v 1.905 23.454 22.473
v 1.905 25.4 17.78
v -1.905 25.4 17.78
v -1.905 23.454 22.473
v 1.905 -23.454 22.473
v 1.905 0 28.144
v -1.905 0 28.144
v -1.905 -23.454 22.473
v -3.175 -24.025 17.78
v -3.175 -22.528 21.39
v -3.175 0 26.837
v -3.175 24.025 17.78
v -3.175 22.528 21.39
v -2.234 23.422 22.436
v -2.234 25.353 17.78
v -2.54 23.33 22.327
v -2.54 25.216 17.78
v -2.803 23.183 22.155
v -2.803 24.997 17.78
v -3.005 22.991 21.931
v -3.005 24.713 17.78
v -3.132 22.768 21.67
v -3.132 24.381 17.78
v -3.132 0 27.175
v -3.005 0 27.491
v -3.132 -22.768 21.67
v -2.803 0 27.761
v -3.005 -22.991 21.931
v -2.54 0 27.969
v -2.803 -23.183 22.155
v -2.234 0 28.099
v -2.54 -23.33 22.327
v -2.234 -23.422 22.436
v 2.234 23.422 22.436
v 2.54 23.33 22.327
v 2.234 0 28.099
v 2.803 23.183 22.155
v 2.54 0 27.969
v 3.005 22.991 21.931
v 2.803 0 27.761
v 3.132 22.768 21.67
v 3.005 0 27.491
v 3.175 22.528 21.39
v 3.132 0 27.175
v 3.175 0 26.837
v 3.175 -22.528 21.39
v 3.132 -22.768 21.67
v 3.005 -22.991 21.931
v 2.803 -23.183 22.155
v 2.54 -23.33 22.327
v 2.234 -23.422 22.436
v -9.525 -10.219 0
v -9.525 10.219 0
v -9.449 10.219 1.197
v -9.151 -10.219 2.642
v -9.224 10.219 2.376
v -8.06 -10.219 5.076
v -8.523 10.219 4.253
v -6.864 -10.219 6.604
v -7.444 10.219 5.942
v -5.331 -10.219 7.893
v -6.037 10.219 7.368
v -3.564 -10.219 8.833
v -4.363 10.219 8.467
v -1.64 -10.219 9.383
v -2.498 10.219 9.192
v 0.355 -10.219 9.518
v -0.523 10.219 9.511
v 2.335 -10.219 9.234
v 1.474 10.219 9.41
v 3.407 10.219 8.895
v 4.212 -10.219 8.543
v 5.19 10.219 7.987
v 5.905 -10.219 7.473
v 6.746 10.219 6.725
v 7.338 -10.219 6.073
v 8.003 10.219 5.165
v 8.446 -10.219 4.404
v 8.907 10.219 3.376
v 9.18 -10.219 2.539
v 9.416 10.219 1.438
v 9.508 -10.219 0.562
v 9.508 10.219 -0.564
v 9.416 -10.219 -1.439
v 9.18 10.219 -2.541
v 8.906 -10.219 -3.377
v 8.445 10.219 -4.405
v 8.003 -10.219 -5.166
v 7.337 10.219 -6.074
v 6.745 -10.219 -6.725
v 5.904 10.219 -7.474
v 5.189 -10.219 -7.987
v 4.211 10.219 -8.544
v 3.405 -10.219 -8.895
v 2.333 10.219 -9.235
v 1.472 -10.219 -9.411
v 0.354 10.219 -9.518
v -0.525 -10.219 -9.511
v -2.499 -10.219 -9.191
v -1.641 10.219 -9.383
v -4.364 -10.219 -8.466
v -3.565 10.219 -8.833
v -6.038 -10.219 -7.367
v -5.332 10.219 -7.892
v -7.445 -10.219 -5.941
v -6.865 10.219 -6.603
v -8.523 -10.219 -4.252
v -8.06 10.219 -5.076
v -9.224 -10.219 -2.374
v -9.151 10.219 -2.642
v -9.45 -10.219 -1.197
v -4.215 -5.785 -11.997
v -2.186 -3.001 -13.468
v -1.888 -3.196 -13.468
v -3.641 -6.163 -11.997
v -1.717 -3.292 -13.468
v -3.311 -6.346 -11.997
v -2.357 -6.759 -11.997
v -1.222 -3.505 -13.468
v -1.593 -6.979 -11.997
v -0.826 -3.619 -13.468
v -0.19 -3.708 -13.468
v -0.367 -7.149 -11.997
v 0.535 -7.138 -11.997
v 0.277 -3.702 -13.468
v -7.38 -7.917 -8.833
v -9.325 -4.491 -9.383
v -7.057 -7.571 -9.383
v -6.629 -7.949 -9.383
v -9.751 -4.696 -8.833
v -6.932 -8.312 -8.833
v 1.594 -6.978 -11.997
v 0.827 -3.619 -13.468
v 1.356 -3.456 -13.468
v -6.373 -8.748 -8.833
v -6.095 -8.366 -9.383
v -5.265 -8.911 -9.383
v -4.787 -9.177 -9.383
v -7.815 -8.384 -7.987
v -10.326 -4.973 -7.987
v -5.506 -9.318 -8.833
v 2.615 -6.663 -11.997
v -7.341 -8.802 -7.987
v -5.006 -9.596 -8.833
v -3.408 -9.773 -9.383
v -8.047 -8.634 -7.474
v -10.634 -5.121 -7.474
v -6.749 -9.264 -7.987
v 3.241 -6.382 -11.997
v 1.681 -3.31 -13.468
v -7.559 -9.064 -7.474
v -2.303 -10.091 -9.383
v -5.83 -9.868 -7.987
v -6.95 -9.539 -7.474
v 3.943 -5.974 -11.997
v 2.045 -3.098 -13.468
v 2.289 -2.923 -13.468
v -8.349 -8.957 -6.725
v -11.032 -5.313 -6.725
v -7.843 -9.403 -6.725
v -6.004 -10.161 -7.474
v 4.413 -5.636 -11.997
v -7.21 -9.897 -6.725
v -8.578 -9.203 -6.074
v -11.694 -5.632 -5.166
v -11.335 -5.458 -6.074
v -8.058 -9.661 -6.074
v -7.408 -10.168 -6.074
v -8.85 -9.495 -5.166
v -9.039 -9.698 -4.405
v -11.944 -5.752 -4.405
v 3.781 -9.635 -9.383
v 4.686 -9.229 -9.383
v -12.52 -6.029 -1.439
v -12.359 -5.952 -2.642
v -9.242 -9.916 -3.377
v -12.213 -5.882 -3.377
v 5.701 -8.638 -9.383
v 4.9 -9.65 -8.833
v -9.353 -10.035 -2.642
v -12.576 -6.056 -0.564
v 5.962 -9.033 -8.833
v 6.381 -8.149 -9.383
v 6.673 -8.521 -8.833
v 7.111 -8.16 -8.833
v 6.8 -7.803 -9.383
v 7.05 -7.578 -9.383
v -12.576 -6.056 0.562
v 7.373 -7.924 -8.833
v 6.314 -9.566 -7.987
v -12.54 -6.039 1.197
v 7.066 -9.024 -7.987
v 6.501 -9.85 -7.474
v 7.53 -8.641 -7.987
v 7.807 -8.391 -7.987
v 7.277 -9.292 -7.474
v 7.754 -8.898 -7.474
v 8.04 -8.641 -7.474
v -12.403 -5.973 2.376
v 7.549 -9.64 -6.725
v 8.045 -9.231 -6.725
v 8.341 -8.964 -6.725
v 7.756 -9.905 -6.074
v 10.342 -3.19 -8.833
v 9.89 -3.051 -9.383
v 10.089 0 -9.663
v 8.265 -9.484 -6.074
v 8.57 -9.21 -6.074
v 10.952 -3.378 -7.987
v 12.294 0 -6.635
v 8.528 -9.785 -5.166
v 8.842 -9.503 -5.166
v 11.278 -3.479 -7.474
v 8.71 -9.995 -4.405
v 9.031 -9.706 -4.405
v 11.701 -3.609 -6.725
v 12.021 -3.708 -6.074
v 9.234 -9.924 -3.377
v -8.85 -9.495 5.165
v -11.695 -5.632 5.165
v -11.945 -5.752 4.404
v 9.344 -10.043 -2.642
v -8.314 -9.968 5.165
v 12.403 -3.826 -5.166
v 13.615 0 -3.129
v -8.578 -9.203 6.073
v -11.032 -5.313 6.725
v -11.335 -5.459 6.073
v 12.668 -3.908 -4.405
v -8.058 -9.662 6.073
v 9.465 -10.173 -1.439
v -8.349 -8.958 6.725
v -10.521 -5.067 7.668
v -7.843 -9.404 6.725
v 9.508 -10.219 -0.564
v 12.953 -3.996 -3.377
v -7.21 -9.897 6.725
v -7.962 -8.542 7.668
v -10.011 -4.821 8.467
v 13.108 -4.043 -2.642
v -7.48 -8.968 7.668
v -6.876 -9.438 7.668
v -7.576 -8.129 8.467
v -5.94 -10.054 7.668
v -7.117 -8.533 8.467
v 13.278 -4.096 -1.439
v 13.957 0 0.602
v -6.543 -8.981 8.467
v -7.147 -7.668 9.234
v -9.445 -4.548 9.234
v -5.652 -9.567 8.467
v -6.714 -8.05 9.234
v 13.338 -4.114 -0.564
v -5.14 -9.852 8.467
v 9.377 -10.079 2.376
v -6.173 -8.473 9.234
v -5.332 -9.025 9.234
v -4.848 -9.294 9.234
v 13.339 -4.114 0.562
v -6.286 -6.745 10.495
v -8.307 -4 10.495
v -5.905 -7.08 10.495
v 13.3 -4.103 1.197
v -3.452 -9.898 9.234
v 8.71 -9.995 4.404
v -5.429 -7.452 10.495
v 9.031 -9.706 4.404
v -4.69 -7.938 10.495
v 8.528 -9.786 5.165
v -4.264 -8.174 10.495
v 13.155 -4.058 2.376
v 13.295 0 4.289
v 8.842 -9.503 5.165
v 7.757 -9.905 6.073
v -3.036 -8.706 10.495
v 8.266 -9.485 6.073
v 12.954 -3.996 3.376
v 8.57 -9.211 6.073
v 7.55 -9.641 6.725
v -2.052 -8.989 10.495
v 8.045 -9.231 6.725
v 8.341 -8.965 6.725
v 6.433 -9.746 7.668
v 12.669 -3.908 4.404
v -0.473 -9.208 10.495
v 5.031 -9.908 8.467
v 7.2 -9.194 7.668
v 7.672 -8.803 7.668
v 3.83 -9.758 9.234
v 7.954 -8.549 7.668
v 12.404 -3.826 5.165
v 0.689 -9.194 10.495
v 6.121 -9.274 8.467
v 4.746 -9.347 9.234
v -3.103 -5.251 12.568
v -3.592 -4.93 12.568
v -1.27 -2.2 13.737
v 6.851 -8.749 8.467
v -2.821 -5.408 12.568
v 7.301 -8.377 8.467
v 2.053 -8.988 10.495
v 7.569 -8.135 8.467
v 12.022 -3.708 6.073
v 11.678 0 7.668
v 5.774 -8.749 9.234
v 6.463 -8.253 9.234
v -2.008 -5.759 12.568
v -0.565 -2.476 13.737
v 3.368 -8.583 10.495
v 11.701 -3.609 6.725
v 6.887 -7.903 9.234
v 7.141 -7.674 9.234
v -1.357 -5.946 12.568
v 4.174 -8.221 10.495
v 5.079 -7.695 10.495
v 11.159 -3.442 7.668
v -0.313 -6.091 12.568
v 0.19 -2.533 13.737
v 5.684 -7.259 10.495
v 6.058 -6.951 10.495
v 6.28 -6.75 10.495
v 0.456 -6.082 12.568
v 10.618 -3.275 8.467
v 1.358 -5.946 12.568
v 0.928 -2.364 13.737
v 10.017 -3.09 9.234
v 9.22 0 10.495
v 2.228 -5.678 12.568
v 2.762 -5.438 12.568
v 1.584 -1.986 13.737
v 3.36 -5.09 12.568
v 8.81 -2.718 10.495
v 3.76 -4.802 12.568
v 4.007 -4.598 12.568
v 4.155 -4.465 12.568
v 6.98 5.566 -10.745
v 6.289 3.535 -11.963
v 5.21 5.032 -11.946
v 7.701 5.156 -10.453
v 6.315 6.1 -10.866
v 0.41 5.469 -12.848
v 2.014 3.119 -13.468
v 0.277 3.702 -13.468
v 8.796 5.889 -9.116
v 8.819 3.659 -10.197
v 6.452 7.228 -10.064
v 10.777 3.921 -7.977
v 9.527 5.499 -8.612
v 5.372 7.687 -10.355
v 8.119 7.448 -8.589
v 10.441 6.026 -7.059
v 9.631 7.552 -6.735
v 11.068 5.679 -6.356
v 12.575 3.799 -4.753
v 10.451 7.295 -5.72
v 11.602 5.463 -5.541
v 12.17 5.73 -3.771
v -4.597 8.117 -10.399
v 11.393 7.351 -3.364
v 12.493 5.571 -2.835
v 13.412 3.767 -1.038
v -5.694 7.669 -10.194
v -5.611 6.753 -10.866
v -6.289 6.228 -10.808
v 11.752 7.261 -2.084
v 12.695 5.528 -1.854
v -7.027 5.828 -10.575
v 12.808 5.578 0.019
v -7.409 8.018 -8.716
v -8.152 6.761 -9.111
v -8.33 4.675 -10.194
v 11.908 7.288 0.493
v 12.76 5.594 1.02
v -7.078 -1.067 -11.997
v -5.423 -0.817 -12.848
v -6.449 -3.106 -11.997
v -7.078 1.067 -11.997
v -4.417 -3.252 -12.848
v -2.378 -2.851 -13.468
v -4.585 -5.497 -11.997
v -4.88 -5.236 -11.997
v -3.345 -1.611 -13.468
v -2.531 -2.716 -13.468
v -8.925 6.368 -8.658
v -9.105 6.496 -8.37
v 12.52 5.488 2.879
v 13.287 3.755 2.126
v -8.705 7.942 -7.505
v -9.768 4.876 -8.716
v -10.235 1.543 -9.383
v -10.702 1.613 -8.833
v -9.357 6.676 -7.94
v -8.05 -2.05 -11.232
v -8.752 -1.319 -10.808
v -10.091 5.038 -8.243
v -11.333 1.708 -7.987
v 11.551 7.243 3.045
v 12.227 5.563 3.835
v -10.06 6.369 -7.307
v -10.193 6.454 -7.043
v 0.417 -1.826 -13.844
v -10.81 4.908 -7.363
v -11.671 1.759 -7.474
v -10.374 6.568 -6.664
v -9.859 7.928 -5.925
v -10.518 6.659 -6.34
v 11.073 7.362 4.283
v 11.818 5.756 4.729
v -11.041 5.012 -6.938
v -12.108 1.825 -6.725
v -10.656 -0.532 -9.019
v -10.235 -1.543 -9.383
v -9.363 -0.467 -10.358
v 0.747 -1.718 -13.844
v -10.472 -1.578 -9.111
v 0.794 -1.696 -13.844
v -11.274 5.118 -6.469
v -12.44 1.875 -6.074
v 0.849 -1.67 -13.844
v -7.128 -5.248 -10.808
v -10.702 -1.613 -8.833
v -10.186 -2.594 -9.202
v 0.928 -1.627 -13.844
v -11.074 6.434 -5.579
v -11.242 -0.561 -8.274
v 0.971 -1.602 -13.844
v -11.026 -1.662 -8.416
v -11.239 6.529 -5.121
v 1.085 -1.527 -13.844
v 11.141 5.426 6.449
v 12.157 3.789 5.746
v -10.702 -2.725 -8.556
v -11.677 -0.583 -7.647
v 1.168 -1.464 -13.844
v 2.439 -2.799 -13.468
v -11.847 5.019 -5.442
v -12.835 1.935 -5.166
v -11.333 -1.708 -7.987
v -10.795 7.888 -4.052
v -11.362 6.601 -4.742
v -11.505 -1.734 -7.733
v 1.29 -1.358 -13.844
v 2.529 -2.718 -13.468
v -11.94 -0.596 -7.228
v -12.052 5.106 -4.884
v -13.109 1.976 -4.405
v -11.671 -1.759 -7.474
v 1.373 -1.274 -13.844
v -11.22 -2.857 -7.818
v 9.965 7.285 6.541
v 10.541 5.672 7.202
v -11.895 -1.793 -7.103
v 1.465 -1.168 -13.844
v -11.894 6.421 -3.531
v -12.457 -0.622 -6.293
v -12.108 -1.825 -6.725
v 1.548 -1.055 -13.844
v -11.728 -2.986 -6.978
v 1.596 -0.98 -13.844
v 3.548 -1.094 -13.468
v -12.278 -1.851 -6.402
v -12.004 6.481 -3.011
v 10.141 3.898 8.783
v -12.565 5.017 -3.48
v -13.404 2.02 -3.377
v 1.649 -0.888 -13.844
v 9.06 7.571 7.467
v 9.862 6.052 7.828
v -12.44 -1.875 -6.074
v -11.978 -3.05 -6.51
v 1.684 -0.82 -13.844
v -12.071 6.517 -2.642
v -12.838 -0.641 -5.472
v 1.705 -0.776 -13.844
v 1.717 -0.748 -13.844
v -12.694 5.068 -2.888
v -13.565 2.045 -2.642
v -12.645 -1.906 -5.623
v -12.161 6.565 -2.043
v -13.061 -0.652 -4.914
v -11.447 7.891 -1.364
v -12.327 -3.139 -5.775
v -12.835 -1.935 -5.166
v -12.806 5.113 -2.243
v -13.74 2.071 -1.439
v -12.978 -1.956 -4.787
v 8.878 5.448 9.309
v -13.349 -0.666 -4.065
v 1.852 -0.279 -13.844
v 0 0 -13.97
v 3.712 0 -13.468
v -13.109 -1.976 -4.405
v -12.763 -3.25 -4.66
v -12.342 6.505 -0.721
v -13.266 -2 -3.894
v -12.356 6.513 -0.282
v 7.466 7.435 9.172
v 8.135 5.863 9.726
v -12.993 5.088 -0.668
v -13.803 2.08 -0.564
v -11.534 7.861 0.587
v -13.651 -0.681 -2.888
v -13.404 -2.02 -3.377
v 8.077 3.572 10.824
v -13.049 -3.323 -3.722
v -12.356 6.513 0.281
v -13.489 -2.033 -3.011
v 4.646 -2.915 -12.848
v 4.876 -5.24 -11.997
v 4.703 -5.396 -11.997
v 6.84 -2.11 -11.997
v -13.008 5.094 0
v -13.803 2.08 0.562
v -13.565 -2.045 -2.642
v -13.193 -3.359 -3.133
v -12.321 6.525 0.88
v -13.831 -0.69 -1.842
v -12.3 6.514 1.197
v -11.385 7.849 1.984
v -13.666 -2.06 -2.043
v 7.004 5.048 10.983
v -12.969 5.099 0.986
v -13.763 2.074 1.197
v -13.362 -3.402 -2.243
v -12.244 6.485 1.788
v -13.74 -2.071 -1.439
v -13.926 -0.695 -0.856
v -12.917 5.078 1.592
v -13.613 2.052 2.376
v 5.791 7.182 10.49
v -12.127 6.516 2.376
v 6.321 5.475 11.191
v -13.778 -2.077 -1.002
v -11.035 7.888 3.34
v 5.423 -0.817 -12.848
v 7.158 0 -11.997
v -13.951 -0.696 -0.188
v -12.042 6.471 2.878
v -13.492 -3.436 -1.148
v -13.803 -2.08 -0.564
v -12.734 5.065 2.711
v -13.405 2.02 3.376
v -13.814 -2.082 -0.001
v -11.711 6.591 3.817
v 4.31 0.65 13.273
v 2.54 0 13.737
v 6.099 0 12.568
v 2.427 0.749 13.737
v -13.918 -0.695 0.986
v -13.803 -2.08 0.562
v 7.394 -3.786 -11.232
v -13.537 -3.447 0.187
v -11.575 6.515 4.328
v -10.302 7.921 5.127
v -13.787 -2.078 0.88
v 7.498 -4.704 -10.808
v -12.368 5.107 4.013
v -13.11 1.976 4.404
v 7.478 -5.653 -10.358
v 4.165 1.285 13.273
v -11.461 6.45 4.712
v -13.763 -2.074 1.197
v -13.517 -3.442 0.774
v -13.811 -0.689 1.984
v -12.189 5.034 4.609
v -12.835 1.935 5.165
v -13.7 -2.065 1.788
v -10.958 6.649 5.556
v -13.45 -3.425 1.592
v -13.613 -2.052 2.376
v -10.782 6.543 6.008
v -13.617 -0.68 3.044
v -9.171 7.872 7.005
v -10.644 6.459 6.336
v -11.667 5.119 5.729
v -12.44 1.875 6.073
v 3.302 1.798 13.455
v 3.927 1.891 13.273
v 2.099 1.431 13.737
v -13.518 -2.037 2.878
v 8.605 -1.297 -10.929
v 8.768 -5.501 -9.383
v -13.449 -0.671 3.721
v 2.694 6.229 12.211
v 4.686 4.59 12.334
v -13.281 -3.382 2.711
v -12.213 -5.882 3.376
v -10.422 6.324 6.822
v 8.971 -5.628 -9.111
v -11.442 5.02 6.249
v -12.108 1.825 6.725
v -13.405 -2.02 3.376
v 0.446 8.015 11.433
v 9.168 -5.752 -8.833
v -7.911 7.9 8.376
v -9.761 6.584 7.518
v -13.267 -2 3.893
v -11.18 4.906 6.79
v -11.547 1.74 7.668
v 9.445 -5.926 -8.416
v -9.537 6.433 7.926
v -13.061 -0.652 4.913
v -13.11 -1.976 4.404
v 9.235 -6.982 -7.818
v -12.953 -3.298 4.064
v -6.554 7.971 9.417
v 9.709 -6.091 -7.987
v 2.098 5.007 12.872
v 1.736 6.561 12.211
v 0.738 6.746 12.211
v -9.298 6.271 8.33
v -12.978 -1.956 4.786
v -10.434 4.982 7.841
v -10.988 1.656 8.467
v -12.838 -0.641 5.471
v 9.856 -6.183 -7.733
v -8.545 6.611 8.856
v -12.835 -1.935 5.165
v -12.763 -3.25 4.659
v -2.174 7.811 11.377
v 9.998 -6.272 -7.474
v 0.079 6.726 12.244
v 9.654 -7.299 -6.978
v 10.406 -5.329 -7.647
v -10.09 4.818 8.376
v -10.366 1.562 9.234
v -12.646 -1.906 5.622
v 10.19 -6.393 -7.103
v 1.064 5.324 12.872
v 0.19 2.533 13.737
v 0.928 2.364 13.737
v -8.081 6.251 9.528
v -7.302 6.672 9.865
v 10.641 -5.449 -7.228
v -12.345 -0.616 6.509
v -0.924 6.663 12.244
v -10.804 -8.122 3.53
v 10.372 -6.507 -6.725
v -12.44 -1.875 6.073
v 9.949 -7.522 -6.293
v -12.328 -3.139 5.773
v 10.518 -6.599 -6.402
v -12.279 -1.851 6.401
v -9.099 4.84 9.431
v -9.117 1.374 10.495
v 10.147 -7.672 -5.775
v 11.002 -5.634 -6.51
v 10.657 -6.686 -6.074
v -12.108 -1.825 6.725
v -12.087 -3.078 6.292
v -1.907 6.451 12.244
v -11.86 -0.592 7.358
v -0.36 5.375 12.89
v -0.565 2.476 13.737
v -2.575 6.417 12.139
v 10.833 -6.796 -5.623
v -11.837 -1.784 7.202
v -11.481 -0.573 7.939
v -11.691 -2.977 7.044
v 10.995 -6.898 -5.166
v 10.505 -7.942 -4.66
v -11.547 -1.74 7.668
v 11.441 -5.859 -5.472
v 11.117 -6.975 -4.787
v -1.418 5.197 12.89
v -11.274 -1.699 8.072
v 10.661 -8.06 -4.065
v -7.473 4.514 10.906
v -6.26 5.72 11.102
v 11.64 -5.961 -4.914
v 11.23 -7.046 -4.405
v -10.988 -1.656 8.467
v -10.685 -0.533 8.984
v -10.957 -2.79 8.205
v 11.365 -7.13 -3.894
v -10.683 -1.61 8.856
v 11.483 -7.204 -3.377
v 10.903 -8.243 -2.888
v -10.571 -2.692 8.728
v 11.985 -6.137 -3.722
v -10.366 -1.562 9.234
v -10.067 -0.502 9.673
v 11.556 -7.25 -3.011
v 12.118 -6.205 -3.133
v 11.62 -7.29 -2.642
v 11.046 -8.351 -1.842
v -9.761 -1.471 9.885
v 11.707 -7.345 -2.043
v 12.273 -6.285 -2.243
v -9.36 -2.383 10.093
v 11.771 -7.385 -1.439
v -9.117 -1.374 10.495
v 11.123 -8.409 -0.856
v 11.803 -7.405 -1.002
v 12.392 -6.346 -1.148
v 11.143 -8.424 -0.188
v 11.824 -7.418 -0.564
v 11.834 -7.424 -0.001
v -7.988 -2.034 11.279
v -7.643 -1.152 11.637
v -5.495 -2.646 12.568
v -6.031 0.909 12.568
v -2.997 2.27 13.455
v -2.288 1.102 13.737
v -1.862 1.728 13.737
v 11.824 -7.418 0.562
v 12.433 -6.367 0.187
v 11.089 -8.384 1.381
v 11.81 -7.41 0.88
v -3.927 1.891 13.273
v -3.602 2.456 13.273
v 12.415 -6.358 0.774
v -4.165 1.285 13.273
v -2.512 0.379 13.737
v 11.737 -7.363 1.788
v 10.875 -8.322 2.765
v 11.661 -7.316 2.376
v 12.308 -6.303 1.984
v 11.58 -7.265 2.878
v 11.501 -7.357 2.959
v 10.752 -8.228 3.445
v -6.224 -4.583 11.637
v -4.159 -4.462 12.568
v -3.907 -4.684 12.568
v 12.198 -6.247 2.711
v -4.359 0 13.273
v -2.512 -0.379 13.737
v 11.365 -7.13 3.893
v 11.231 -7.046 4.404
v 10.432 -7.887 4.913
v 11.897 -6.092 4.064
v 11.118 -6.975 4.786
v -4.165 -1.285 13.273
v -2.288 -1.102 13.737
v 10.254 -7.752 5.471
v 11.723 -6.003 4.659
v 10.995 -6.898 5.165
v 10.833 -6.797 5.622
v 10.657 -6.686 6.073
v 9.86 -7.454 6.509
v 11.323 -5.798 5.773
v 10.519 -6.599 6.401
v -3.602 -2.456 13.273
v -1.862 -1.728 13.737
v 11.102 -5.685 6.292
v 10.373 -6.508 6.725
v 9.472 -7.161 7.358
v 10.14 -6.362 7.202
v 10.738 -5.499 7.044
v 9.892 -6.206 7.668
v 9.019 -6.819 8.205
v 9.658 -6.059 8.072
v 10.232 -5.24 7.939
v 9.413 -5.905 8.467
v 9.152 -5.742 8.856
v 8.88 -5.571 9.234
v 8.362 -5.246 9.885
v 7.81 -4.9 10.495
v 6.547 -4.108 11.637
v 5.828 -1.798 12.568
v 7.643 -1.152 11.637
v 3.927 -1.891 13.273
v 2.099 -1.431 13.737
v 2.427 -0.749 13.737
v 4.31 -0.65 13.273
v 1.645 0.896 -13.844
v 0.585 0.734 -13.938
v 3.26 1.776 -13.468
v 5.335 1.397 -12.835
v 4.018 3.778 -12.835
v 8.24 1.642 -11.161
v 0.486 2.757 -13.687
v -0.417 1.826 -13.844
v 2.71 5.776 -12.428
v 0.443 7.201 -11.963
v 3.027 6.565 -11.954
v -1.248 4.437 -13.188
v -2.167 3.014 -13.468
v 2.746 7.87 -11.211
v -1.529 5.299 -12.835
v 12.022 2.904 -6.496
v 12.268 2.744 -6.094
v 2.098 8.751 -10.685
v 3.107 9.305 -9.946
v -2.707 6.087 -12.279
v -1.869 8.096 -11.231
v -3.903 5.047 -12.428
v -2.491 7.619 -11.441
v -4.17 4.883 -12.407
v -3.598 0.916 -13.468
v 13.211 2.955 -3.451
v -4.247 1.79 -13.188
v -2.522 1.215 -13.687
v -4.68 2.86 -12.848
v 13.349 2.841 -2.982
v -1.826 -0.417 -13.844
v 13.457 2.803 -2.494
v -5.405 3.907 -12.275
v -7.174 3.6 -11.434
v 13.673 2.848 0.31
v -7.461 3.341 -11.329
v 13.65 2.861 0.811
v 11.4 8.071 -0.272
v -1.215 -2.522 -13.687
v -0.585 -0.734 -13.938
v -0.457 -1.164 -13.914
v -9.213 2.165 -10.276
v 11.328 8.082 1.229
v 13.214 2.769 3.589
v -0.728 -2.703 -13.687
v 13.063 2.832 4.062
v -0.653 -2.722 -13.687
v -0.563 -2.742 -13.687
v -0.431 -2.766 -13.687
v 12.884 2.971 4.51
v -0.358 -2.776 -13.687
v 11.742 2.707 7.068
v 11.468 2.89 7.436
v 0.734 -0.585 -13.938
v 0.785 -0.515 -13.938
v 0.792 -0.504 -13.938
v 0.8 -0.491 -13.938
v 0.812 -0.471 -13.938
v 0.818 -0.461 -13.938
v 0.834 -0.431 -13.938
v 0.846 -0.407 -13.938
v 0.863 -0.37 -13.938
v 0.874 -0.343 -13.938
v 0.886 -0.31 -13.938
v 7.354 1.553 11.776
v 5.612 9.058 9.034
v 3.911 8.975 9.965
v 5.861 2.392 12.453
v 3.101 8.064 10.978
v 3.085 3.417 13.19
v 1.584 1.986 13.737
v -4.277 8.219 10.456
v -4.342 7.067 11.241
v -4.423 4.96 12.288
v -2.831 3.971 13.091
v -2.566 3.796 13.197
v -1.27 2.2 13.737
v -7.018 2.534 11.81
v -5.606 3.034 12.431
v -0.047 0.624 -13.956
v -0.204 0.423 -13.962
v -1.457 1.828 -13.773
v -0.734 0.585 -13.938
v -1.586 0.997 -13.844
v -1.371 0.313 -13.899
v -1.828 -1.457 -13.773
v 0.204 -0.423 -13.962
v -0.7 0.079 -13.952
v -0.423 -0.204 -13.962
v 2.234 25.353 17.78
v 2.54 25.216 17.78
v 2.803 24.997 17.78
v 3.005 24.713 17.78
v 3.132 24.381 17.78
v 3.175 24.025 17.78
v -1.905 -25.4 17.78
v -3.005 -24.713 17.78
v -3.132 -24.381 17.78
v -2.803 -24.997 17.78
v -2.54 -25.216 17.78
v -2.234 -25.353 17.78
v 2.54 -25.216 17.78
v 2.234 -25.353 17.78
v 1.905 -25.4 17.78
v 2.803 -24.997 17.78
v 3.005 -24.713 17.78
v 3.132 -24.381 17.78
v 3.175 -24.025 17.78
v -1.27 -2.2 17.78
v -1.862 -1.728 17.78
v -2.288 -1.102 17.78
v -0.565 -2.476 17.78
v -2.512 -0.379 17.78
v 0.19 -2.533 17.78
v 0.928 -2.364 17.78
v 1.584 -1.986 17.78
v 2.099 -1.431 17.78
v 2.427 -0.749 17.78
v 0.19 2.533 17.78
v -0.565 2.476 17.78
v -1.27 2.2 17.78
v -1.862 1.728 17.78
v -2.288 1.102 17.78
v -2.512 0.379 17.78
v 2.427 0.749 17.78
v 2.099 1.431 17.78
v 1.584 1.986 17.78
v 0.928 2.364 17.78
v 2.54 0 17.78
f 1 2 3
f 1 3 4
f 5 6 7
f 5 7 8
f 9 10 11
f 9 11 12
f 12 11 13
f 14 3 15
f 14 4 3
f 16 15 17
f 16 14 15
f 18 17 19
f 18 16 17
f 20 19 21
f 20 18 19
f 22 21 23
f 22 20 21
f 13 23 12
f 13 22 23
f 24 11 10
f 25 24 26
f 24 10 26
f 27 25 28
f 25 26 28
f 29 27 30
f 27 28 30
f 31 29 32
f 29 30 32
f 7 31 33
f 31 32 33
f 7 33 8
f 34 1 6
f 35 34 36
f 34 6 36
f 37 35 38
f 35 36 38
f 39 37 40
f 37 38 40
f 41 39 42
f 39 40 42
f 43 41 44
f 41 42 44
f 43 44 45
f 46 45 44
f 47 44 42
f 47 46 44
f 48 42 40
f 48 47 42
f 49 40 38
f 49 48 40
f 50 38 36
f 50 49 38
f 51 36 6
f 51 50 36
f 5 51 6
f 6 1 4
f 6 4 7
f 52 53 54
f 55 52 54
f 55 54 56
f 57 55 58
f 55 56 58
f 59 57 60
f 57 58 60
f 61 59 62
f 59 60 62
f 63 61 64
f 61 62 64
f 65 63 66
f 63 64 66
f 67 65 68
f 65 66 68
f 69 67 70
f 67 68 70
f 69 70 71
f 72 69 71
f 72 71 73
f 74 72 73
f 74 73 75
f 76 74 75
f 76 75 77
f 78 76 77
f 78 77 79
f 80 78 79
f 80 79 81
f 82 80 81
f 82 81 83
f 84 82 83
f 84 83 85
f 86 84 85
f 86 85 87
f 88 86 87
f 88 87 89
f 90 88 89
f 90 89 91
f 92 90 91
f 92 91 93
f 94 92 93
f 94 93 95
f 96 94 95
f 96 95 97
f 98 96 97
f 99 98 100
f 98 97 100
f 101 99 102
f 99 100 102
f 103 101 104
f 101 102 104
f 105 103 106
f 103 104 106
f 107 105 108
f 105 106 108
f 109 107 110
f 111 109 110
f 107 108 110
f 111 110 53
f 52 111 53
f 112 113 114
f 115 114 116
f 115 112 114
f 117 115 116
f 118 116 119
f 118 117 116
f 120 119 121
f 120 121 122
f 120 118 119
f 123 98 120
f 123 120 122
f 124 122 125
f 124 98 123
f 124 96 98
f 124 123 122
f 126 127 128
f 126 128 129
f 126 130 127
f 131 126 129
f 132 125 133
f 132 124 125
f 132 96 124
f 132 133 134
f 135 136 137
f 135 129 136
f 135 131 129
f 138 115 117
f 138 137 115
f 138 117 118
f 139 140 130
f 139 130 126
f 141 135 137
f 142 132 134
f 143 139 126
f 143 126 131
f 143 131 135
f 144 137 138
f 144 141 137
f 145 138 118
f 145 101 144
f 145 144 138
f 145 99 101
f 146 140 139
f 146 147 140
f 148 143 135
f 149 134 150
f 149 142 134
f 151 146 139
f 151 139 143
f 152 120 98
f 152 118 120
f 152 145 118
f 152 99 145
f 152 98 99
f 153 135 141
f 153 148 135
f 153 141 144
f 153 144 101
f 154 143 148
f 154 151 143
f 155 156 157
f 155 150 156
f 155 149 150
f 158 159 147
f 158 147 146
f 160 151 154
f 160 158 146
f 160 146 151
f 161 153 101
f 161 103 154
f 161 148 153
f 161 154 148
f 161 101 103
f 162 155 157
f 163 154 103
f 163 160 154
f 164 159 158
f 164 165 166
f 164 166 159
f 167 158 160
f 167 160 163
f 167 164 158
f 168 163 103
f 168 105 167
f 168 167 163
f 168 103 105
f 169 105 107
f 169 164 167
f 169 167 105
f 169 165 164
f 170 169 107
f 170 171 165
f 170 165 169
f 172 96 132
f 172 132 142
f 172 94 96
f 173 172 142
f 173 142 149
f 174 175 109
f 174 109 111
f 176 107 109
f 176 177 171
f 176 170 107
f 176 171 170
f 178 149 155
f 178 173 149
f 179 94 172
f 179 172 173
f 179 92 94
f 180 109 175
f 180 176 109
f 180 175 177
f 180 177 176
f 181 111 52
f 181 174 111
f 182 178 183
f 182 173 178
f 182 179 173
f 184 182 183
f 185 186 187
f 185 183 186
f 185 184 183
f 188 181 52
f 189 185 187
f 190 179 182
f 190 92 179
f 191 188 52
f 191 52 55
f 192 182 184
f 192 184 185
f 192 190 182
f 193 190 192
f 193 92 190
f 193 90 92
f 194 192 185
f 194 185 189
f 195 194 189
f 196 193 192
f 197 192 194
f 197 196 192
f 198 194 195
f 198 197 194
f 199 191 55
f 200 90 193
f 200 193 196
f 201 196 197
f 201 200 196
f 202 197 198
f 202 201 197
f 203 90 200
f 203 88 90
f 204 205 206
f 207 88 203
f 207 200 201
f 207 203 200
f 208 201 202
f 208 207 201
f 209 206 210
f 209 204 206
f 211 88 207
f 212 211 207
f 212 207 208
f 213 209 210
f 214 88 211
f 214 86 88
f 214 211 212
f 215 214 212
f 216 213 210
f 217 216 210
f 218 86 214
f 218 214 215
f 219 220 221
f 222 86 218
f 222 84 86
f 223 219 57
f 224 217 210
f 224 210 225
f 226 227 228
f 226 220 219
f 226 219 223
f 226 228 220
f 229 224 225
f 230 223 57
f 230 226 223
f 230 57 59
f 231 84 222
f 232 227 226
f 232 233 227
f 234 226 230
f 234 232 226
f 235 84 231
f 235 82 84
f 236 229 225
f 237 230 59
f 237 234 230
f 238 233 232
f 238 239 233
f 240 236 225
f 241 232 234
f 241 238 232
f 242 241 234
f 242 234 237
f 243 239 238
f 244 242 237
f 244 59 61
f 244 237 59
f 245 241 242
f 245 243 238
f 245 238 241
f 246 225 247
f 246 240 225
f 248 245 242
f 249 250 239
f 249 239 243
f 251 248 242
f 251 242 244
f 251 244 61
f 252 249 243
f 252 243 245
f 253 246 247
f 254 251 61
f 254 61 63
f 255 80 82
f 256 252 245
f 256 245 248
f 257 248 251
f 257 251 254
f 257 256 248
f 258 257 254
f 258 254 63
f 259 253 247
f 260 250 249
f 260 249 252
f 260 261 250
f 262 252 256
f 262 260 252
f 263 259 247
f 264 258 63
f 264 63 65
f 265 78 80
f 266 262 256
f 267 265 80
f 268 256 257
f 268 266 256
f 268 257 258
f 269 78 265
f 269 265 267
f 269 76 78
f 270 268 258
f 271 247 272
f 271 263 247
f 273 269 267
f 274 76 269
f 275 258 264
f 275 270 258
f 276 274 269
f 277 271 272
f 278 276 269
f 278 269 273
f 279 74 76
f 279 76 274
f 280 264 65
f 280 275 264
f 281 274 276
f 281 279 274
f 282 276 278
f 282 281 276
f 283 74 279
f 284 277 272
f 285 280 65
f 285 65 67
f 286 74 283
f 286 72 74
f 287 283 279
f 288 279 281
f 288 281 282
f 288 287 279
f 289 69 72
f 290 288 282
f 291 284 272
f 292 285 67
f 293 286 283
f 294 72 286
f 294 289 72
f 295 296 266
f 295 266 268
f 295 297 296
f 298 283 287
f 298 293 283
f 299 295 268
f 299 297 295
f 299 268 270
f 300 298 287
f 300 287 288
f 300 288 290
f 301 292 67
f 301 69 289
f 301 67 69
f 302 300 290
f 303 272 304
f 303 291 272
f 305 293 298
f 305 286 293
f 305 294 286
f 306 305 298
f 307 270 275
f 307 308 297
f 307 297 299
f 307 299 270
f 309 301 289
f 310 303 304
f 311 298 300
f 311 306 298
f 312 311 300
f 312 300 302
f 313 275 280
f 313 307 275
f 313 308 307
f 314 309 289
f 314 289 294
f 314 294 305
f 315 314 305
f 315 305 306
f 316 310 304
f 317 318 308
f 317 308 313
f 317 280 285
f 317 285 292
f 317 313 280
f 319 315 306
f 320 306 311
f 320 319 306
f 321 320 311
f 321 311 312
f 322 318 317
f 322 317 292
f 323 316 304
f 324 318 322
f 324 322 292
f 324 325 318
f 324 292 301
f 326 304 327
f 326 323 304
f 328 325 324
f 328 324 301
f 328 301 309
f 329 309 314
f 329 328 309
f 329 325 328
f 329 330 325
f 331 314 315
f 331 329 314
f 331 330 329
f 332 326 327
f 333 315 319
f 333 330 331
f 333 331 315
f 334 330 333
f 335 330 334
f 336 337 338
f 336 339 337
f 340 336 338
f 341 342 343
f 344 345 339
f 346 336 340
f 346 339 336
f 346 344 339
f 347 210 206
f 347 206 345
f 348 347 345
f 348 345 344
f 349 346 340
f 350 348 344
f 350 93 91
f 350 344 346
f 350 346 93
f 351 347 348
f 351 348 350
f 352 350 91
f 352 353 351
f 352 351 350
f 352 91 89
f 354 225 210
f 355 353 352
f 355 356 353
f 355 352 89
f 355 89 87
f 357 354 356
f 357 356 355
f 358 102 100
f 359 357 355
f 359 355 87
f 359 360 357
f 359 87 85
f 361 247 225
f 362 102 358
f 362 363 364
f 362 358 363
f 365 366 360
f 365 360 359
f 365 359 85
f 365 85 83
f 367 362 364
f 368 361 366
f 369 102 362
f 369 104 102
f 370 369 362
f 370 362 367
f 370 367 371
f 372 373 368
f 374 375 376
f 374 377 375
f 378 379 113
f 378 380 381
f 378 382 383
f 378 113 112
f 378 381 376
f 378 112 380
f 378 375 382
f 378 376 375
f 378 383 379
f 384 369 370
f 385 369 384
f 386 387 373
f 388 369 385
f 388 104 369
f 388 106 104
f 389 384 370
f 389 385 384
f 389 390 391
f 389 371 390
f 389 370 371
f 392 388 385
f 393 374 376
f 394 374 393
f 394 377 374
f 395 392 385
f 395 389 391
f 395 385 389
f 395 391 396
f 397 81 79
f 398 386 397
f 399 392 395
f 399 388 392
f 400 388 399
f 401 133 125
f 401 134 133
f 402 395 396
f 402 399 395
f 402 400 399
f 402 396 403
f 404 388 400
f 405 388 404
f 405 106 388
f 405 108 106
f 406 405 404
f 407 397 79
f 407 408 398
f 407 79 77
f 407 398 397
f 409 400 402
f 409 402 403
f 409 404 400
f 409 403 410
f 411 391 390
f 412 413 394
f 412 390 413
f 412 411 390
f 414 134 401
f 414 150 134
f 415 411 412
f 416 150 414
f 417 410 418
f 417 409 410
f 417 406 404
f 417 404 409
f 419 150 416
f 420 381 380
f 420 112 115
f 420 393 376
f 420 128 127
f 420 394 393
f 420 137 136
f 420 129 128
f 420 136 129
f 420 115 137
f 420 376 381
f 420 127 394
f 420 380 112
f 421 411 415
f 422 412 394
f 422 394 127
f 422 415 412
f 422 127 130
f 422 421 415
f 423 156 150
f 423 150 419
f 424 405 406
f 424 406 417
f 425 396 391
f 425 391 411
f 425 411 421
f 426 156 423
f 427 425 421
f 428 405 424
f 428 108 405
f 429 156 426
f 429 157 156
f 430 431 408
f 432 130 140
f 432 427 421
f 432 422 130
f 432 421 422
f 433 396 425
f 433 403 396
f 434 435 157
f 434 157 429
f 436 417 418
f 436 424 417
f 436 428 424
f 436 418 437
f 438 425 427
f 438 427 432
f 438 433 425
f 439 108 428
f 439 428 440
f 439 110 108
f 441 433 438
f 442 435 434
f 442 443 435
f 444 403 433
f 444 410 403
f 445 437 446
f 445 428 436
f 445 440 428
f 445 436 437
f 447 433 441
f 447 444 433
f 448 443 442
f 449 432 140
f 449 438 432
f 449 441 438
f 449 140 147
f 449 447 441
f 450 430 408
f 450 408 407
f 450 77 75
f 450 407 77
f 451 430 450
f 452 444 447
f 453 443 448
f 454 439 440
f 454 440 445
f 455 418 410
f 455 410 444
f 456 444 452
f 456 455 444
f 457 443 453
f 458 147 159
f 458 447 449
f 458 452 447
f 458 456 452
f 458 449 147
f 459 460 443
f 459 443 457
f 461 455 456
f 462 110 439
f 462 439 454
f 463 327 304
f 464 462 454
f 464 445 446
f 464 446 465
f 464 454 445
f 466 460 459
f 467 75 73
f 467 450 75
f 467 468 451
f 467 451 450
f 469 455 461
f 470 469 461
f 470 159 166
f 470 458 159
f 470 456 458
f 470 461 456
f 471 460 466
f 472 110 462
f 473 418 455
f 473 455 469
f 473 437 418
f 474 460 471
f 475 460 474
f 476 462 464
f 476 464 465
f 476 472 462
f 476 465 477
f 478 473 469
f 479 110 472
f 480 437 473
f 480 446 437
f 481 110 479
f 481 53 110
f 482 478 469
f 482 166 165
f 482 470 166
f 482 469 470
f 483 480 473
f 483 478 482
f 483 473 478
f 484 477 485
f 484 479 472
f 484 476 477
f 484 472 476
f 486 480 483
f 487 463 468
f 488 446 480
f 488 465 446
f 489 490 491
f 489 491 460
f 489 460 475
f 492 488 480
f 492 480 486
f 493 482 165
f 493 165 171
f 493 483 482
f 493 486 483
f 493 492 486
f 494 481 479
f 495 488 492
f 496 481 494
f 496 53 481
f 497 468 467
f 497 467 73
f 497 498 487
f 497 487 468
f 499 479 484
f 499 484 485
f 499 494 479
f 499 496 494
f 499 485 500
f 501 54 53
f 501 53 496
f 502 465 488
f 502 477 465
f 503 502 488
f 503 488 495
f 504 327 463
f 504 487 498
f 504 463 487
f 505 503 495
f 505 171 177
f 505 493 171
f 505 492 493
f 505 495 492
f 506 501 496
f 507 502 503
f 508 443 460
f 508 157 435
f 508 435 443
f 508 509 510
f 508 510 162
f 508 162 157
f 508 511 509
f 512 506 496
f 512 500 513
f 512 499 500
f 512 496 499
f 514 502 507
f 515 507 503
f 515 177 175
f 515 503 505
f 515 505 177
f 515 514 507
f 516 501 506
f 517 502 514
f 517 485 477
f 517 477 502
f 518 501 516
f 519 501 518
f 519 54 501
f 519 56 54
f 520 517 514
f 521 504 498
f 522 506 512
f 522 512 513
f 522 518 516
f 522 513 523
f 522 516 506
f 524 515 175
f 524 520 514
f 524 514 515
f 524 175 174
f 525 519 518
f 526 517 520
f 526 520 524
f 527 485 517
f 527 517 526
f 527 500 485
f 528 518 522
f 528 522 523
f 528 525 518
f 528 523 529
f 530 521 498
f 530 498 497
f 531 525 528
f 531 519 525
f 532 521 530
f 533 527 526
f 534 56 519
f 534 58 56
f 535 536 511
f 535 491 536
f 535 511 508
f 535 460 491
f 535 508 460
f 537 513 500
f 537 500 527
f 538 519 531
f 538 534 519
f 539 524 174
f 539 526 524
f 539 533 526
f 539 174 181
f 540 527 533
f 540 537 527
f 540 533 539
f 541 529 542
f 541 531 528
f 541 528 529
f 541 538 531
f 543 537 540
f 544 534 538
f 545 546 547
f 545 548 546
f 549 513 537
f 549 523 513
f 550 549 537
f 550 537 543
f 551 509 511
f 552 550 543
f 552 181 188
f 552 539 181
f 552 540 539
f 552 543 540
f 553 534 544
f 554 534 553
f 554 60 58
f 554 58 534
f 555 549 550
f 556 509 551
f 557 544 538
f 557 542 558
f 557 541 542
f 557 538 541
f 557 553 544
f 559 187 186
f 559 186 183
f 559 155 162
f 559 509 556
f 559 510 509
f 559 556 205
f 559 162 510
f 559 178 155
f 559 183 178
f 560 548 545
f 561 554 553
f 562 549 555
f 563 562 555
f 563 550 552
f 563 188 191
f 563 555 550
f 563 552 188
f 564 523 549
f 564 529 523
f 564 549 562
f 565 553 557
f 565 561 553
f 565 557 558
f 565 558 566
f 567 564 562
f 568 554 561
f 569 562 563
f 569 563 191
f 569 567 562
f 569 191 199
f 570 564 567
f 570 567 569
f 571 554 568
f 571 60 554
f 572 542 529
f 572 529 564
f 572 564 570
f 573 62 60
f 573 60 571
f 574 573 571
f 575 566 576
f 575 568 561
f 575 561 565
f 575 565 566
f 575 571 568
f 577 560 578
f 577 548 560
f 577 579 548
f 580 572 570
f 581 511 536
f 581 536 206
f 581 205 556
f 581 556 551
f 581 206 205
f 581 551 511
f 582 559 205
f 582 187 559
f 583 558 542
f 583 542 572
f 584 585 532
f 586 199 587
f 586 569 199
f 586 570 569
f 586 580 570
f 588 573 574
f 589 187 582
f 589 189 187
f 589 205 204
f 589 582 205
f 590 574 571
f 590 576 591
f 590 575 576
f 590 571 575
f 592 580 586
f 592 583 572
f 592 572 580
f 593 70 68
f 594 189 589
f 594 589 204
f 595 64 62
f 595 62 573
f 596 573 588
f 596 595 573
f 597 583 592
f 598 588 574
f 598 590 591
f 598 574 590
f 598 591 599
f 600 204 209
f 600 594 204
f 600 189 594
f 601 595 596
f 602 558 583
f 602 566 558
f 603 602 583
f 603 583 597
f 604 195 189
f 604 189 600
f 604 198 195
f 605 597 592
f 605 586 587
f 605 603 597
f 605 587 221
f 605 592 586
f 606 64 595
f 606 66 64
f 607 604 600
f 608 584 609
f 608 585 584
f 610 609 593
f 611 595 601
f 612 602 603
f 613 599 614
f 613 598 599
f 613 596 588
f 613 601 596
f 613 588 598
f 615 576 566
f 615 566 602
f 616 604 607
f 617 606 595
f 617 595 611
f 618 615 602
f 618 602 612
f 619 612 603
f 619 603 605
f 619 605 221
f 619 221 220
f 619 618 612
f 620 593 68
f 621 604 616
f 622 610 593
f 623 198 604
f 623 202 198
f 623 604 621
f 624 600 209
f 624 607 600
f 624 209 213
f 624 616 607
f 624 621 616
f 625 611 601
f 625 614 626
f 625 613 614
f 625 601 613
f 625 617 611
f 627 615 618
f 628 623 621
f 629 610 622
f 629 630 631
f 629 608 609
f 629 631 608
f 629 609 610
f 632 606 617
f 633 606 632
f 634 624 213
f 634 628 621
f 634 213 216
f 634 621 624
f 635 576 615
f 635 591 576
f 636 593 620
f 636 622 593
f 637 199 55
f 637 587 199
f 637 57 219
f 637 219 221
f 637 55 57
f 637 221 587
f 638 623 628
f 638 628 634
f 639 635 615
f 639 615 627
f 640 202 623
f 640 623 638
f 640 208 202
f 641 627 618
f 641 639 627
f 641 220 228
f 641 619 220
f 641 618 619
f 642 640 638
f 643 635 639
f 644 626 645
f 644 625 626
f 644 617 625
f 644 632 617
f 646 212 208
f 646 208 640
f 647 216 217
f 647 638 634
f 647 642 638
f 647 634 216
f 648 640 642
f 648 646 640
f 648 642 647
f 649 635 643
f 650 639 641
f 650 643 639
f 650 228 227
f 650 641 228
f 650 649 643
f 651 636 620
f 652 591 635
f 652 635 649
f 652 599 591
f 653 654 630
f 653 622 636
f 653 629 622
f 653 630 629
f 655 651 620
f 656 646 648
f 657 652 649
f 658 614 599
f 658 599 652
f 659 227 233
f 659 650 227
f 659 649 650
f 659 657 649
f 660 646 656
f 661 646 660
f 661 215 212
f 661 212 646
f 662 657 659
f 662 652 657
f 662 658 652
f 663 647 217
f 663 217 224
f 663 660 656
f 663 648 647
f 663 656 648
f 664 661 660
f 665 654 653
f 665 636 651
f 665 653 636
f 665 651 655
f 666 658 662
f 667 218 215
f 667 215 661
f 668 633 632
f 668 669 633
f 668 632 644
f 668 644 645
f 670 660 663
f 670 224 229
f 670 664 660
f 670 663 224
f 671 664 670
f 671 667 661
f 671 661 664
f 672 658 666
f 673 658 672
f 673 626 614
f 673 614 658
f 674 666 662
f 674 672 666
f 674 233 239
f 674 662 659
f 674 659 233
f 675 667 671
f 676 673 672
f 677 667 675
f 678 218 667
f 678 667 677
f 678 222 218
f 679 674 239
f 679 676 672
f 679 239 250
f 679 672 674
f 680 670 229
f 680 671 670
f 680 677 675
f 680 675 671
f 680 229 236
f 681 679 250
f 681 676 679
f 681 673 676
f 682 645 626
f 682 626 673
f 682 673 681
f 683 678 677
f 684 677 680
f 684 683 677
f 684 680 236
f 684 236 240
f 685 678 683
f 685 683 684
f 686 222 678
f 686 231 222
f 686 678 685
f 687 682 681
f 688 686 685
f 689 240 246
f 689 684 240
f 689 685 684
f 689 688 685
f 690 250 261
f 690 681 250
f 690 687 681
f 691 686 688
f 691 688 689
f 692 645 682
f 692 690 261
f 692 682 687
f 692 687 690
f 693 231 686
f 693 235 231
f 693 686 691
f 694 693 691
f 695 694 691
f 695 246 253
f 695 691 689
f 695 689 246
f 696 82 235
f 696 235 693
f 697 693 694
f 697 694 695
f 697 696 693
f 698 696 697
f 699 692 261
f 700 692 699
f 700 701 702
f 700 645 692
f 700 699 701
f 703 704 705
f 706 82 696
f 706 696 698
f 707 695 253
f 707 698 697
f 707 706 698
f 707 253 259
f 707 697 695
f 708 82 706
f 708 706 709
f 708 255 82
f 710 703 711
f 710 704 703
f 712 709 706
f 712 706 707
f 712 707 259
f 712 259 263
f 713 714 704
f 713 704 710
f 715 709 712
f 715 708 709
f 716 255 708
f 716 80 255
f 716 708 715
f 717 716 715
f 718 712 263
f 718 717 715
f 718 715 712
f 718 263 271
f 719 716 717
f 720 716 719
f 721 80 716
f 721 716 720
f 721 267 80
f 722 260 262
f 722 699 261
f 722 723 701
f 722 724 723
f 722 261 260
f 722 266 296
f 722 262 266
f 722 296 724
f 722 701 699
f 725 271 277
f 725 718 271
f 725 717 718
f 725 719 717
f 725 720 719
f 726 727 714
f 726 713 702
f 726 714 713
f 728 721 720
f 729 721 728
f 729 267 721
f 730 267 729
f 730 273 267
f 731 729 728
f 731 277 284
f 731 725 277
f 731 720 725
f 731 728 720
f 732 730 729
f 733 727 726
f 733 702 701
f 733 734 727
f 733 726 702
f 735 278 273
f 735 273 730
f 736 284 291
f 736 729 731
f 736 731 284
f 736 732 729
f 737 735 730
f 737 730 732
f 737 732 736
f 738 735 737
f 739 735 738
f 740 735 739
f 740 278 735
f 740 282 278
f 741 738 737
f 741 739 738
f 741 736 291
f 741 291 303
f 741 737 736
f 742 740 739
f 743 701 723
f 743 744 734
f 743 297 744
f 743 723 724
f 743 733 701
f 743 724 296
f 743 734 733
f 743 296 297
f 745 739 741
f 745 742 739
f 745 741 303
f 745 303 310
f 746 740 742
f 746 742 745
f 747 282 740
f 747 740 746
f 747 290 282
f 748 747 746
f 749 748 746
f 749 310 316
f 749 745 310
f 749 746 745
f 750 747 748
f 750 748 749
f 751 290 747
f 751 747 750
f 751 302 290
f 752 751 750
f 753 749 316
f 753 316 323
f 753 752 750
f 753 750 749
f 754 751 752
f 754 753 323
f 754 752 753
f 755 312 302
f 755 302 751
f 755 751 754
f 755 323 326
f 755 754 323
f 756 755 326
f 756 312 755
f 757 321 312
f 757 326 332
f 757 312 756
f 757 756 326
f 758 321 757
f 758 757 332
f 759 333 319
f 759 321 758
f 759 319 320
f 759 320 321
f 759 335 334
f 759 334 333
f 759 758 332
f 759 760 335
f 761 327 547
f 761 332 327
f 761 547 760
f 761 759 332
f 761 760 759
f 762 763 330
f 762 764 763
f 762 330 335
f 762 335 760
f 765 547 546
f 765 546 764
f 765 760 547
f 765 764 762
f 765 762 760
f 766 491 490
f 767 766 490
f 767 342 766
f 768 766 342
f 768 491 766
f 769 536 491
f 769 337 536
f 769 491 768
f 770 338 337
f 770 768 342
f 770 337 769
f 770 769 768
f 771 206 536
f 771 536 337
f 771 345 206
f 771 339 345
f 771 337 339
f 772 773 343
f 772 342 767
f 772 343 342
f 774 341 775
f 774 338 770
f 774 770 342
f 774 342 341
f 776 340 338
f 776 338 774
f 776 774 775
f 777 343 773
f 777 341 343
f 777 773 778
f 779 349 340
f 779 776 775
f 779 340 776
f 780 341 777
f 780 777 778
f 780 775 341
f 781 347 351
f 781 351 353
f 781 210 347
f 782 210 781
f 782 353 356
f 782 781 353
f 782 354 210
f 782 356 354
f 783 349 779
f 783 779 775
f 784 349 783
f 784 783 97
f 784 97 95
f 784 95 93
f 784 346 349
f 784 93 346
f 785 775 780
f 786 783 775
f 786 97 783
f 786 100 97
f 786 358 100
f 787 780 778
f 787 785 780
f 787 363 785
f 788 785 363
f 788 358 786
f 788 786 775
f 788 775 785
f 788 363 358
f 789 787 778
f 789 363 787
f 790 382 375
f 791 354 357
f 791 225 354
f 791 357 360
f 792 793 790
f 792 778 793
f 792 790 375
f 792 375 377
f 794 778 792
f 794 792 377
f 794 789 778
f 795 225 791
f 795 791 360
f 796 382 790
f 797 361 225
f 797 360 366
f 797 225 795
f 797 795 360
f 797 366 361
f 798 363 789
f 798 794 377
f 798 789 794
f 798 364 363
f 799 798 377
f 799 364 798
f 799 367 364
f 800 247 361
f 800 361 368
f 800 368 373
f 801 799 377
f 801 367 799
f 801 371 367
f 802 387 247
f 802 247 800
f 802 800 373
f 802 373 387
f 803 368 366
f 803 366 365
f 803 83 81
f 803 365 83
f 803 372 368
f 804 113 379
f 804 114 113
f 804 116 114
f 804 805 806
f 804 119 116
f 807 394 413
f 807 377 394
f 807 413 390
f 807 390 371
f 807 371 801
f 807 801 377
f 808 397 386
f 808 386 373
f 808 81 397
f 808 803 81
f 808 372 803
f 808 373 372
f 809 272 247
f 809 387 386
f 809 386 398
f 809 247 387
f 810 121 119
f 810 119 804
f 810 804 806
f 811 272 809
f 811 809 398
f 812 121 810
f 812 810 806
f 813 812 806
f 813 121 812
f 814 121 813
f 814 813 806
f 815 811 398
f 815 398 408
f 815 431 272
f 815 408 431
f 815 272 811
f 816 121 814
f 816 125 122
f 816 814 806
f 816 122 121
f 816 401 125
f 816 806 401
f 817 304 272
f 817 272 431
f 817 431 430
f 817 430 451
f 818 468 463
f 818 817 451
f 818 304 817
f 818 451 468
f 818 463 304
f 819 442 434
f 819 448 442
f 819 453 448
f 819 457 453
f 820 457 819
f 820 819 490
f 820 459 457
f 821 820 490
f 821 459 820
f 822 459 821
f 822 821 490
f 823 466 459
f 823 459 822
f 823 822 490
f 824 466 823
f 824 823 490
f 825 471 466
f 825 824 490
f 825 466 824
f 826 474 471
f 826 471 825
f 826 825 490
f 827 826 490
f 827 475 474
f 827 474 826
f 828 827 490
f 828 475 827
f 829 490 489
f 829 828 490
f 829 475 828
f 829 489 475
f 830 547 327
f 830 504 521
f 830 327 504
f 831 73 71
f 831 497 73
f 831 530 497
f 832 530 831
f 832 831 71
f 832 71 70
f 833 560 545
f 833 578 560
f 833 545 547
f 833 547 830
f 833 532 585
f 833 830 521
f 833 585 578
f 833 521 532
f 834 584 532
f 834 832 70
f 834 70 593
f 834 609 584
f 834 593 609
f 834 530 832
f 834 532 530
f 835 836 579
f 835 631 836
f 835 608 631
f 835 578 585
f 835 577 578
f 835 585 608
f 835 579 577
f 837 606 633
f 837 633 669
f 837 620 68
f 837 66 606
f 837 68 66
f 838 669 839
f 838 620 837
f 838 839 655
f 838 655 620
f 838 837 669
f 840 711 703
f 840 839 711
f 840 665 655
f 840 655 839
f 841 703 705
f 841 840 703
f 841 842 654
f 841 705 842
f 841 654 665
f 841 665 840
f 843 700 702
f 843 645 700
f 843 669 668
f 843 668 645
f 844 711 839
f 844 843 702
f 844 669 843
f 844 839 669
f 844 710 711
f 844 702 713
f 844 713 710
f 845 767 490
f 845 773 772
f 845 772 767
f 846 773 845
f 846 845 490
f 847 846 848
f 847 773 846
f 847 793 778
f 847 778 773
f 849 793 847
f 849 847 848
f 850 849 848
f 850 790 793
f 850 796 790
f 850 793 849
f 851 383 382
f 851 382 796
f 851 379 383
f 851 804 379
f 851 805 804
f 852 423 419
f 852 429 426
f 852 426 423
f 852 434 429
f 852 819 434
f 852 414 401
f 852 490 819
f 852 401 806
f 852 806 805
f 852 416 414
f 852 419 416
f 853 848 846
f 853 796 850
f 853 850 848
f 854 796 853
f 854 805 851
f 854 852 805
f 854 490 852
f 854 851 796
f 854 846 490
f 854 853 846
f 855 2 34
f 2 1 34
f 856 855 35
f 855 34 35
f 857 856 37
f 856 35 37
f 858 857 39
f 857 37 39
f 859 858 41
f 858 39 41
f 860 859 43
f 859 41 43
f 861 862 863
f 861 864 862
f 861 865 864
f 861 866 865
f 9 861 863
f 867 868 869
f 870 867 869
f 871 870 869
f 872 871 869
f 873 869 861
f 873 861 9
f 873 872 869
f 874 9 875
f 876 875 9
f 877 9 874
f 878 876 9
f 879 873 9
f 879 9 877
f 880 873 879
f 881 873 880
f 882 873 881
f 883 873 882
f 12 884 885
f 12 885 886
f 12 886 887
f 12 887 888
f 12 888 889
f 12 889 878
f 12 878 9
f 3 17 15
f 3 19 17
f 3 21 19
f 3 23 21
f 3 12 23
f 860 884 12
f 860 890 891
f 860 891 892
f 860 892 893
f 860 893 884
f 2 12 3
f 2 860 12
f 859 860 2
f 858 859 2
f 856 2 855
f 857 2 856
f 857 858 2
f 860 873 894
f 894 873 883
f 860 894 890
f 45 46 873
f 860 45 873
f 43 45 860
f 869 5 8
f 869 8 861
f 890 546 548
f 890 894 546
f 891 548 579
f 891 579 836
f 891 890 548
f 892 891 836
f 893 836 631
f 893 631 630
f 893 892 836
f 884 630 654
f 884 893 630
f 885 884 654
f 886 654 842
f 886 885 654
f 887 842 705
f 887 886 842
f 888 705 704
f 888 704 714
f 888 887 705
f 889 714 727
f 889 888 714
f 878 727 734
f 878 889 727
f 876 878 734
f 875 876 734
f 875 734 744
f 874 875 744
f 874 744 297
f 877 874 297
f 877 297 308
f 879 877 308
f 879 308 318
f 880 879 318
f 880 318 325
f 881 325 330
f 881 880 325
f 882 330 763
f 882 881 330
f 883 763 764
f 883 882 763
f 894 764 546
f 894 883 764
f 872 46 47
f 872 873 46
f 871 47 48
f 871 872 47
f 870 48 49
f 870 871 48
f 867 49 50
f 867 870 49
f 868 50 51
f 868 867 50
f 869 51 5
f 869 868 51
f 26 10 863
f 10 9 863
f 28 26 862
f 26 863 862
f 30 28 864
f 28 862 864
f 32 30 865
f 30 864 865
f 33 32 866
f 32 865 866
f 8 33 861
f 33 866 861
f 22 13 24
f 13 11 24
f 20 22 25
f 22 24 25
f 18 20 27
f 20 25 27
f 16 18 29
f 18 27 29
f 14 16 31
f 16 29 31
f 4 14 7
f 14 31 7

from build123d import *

# Parameters (mm, degrees)
F3_D     = 19.05
F3_DEPTH = 25.4
F4_D     = 19.05
F4_DEPTH = 25.4
F6_DEPTH = 3.175
F7_R     = 1.27


with BuildPart() as f2:
    # F0 (on Front) → F2 (revolve)
    with BuildSketch(Plane.XZ):
        with BuildLine():
            ThreePointArc((2.54, 13.73715), (1.275325, 13.911666), (0, 13.97))
            Line((0, 13.97), (0, -13.97))
            ThreePointArc((0, -13.97), (13.911666, -1.275325), (2.54, 13.73715))
        make_face()
        with BuildLine():
            Line((0, 17.78), (0, 13.97))
            ThreePointArc((0, 13.97), (1.275325, 13.911666), (2.54, 13.73715))
            Line((2.54, 13.73715), (2.54, 17.78))
            Line((2.54, 17.78), (0, 17.78))
        make_face()
    revolve(axis=Axis((0, 0, 6.35), (0, 0, 1)))

    # F3
    with Locations(Plane.XZ):
        with Locations((0, 0)):
            Hole(F3_D / 2, depth=F3_DEPTH)

    # F4
    with Locations(Plane(origin=(0, 0, 0), x_dir=(1, 0, 0), z_dir=(0, 1, 0))):
        with Locations((0, 0)):
            Hole(F4_D / 2, depth=F4_DEPTH)

    # F5 (on Right) → F6 (join, symmetric)
    with BuildSketch(Plane.YZ):
        Polygon((0, 28.143921), (0, 17.78), (25.4, 17.78), (23.45404, 22.472509), align=None)
        Polygon((-25.4, 17.78), (0, 17.78), (0, 28.143921), (-23.45404, 22.472509), align=None)
    extrude(amount=F6_DEPTH, both=True)

    # F7
    f7_edges = [f2.edges().sort_by_distance(p)[0] for p in [
        (3.175, -11.72702, 25.308215),
        (-3.175, -11.72702, 25.308215),
        (3.175, 11.72702, 25.308215),
        (-3.175, 11.72702, 25.308215),
        (3.175, 24.42702, 20.126254),
        (3.175, -24.42702, 20.126254),
        (-3.175, -24.42702, 20.126254),
        (-3.175, 24.42702, 20.126254),
    ]]
    fillet(f7_edges, radius=F7_R)


solid = f2.part
